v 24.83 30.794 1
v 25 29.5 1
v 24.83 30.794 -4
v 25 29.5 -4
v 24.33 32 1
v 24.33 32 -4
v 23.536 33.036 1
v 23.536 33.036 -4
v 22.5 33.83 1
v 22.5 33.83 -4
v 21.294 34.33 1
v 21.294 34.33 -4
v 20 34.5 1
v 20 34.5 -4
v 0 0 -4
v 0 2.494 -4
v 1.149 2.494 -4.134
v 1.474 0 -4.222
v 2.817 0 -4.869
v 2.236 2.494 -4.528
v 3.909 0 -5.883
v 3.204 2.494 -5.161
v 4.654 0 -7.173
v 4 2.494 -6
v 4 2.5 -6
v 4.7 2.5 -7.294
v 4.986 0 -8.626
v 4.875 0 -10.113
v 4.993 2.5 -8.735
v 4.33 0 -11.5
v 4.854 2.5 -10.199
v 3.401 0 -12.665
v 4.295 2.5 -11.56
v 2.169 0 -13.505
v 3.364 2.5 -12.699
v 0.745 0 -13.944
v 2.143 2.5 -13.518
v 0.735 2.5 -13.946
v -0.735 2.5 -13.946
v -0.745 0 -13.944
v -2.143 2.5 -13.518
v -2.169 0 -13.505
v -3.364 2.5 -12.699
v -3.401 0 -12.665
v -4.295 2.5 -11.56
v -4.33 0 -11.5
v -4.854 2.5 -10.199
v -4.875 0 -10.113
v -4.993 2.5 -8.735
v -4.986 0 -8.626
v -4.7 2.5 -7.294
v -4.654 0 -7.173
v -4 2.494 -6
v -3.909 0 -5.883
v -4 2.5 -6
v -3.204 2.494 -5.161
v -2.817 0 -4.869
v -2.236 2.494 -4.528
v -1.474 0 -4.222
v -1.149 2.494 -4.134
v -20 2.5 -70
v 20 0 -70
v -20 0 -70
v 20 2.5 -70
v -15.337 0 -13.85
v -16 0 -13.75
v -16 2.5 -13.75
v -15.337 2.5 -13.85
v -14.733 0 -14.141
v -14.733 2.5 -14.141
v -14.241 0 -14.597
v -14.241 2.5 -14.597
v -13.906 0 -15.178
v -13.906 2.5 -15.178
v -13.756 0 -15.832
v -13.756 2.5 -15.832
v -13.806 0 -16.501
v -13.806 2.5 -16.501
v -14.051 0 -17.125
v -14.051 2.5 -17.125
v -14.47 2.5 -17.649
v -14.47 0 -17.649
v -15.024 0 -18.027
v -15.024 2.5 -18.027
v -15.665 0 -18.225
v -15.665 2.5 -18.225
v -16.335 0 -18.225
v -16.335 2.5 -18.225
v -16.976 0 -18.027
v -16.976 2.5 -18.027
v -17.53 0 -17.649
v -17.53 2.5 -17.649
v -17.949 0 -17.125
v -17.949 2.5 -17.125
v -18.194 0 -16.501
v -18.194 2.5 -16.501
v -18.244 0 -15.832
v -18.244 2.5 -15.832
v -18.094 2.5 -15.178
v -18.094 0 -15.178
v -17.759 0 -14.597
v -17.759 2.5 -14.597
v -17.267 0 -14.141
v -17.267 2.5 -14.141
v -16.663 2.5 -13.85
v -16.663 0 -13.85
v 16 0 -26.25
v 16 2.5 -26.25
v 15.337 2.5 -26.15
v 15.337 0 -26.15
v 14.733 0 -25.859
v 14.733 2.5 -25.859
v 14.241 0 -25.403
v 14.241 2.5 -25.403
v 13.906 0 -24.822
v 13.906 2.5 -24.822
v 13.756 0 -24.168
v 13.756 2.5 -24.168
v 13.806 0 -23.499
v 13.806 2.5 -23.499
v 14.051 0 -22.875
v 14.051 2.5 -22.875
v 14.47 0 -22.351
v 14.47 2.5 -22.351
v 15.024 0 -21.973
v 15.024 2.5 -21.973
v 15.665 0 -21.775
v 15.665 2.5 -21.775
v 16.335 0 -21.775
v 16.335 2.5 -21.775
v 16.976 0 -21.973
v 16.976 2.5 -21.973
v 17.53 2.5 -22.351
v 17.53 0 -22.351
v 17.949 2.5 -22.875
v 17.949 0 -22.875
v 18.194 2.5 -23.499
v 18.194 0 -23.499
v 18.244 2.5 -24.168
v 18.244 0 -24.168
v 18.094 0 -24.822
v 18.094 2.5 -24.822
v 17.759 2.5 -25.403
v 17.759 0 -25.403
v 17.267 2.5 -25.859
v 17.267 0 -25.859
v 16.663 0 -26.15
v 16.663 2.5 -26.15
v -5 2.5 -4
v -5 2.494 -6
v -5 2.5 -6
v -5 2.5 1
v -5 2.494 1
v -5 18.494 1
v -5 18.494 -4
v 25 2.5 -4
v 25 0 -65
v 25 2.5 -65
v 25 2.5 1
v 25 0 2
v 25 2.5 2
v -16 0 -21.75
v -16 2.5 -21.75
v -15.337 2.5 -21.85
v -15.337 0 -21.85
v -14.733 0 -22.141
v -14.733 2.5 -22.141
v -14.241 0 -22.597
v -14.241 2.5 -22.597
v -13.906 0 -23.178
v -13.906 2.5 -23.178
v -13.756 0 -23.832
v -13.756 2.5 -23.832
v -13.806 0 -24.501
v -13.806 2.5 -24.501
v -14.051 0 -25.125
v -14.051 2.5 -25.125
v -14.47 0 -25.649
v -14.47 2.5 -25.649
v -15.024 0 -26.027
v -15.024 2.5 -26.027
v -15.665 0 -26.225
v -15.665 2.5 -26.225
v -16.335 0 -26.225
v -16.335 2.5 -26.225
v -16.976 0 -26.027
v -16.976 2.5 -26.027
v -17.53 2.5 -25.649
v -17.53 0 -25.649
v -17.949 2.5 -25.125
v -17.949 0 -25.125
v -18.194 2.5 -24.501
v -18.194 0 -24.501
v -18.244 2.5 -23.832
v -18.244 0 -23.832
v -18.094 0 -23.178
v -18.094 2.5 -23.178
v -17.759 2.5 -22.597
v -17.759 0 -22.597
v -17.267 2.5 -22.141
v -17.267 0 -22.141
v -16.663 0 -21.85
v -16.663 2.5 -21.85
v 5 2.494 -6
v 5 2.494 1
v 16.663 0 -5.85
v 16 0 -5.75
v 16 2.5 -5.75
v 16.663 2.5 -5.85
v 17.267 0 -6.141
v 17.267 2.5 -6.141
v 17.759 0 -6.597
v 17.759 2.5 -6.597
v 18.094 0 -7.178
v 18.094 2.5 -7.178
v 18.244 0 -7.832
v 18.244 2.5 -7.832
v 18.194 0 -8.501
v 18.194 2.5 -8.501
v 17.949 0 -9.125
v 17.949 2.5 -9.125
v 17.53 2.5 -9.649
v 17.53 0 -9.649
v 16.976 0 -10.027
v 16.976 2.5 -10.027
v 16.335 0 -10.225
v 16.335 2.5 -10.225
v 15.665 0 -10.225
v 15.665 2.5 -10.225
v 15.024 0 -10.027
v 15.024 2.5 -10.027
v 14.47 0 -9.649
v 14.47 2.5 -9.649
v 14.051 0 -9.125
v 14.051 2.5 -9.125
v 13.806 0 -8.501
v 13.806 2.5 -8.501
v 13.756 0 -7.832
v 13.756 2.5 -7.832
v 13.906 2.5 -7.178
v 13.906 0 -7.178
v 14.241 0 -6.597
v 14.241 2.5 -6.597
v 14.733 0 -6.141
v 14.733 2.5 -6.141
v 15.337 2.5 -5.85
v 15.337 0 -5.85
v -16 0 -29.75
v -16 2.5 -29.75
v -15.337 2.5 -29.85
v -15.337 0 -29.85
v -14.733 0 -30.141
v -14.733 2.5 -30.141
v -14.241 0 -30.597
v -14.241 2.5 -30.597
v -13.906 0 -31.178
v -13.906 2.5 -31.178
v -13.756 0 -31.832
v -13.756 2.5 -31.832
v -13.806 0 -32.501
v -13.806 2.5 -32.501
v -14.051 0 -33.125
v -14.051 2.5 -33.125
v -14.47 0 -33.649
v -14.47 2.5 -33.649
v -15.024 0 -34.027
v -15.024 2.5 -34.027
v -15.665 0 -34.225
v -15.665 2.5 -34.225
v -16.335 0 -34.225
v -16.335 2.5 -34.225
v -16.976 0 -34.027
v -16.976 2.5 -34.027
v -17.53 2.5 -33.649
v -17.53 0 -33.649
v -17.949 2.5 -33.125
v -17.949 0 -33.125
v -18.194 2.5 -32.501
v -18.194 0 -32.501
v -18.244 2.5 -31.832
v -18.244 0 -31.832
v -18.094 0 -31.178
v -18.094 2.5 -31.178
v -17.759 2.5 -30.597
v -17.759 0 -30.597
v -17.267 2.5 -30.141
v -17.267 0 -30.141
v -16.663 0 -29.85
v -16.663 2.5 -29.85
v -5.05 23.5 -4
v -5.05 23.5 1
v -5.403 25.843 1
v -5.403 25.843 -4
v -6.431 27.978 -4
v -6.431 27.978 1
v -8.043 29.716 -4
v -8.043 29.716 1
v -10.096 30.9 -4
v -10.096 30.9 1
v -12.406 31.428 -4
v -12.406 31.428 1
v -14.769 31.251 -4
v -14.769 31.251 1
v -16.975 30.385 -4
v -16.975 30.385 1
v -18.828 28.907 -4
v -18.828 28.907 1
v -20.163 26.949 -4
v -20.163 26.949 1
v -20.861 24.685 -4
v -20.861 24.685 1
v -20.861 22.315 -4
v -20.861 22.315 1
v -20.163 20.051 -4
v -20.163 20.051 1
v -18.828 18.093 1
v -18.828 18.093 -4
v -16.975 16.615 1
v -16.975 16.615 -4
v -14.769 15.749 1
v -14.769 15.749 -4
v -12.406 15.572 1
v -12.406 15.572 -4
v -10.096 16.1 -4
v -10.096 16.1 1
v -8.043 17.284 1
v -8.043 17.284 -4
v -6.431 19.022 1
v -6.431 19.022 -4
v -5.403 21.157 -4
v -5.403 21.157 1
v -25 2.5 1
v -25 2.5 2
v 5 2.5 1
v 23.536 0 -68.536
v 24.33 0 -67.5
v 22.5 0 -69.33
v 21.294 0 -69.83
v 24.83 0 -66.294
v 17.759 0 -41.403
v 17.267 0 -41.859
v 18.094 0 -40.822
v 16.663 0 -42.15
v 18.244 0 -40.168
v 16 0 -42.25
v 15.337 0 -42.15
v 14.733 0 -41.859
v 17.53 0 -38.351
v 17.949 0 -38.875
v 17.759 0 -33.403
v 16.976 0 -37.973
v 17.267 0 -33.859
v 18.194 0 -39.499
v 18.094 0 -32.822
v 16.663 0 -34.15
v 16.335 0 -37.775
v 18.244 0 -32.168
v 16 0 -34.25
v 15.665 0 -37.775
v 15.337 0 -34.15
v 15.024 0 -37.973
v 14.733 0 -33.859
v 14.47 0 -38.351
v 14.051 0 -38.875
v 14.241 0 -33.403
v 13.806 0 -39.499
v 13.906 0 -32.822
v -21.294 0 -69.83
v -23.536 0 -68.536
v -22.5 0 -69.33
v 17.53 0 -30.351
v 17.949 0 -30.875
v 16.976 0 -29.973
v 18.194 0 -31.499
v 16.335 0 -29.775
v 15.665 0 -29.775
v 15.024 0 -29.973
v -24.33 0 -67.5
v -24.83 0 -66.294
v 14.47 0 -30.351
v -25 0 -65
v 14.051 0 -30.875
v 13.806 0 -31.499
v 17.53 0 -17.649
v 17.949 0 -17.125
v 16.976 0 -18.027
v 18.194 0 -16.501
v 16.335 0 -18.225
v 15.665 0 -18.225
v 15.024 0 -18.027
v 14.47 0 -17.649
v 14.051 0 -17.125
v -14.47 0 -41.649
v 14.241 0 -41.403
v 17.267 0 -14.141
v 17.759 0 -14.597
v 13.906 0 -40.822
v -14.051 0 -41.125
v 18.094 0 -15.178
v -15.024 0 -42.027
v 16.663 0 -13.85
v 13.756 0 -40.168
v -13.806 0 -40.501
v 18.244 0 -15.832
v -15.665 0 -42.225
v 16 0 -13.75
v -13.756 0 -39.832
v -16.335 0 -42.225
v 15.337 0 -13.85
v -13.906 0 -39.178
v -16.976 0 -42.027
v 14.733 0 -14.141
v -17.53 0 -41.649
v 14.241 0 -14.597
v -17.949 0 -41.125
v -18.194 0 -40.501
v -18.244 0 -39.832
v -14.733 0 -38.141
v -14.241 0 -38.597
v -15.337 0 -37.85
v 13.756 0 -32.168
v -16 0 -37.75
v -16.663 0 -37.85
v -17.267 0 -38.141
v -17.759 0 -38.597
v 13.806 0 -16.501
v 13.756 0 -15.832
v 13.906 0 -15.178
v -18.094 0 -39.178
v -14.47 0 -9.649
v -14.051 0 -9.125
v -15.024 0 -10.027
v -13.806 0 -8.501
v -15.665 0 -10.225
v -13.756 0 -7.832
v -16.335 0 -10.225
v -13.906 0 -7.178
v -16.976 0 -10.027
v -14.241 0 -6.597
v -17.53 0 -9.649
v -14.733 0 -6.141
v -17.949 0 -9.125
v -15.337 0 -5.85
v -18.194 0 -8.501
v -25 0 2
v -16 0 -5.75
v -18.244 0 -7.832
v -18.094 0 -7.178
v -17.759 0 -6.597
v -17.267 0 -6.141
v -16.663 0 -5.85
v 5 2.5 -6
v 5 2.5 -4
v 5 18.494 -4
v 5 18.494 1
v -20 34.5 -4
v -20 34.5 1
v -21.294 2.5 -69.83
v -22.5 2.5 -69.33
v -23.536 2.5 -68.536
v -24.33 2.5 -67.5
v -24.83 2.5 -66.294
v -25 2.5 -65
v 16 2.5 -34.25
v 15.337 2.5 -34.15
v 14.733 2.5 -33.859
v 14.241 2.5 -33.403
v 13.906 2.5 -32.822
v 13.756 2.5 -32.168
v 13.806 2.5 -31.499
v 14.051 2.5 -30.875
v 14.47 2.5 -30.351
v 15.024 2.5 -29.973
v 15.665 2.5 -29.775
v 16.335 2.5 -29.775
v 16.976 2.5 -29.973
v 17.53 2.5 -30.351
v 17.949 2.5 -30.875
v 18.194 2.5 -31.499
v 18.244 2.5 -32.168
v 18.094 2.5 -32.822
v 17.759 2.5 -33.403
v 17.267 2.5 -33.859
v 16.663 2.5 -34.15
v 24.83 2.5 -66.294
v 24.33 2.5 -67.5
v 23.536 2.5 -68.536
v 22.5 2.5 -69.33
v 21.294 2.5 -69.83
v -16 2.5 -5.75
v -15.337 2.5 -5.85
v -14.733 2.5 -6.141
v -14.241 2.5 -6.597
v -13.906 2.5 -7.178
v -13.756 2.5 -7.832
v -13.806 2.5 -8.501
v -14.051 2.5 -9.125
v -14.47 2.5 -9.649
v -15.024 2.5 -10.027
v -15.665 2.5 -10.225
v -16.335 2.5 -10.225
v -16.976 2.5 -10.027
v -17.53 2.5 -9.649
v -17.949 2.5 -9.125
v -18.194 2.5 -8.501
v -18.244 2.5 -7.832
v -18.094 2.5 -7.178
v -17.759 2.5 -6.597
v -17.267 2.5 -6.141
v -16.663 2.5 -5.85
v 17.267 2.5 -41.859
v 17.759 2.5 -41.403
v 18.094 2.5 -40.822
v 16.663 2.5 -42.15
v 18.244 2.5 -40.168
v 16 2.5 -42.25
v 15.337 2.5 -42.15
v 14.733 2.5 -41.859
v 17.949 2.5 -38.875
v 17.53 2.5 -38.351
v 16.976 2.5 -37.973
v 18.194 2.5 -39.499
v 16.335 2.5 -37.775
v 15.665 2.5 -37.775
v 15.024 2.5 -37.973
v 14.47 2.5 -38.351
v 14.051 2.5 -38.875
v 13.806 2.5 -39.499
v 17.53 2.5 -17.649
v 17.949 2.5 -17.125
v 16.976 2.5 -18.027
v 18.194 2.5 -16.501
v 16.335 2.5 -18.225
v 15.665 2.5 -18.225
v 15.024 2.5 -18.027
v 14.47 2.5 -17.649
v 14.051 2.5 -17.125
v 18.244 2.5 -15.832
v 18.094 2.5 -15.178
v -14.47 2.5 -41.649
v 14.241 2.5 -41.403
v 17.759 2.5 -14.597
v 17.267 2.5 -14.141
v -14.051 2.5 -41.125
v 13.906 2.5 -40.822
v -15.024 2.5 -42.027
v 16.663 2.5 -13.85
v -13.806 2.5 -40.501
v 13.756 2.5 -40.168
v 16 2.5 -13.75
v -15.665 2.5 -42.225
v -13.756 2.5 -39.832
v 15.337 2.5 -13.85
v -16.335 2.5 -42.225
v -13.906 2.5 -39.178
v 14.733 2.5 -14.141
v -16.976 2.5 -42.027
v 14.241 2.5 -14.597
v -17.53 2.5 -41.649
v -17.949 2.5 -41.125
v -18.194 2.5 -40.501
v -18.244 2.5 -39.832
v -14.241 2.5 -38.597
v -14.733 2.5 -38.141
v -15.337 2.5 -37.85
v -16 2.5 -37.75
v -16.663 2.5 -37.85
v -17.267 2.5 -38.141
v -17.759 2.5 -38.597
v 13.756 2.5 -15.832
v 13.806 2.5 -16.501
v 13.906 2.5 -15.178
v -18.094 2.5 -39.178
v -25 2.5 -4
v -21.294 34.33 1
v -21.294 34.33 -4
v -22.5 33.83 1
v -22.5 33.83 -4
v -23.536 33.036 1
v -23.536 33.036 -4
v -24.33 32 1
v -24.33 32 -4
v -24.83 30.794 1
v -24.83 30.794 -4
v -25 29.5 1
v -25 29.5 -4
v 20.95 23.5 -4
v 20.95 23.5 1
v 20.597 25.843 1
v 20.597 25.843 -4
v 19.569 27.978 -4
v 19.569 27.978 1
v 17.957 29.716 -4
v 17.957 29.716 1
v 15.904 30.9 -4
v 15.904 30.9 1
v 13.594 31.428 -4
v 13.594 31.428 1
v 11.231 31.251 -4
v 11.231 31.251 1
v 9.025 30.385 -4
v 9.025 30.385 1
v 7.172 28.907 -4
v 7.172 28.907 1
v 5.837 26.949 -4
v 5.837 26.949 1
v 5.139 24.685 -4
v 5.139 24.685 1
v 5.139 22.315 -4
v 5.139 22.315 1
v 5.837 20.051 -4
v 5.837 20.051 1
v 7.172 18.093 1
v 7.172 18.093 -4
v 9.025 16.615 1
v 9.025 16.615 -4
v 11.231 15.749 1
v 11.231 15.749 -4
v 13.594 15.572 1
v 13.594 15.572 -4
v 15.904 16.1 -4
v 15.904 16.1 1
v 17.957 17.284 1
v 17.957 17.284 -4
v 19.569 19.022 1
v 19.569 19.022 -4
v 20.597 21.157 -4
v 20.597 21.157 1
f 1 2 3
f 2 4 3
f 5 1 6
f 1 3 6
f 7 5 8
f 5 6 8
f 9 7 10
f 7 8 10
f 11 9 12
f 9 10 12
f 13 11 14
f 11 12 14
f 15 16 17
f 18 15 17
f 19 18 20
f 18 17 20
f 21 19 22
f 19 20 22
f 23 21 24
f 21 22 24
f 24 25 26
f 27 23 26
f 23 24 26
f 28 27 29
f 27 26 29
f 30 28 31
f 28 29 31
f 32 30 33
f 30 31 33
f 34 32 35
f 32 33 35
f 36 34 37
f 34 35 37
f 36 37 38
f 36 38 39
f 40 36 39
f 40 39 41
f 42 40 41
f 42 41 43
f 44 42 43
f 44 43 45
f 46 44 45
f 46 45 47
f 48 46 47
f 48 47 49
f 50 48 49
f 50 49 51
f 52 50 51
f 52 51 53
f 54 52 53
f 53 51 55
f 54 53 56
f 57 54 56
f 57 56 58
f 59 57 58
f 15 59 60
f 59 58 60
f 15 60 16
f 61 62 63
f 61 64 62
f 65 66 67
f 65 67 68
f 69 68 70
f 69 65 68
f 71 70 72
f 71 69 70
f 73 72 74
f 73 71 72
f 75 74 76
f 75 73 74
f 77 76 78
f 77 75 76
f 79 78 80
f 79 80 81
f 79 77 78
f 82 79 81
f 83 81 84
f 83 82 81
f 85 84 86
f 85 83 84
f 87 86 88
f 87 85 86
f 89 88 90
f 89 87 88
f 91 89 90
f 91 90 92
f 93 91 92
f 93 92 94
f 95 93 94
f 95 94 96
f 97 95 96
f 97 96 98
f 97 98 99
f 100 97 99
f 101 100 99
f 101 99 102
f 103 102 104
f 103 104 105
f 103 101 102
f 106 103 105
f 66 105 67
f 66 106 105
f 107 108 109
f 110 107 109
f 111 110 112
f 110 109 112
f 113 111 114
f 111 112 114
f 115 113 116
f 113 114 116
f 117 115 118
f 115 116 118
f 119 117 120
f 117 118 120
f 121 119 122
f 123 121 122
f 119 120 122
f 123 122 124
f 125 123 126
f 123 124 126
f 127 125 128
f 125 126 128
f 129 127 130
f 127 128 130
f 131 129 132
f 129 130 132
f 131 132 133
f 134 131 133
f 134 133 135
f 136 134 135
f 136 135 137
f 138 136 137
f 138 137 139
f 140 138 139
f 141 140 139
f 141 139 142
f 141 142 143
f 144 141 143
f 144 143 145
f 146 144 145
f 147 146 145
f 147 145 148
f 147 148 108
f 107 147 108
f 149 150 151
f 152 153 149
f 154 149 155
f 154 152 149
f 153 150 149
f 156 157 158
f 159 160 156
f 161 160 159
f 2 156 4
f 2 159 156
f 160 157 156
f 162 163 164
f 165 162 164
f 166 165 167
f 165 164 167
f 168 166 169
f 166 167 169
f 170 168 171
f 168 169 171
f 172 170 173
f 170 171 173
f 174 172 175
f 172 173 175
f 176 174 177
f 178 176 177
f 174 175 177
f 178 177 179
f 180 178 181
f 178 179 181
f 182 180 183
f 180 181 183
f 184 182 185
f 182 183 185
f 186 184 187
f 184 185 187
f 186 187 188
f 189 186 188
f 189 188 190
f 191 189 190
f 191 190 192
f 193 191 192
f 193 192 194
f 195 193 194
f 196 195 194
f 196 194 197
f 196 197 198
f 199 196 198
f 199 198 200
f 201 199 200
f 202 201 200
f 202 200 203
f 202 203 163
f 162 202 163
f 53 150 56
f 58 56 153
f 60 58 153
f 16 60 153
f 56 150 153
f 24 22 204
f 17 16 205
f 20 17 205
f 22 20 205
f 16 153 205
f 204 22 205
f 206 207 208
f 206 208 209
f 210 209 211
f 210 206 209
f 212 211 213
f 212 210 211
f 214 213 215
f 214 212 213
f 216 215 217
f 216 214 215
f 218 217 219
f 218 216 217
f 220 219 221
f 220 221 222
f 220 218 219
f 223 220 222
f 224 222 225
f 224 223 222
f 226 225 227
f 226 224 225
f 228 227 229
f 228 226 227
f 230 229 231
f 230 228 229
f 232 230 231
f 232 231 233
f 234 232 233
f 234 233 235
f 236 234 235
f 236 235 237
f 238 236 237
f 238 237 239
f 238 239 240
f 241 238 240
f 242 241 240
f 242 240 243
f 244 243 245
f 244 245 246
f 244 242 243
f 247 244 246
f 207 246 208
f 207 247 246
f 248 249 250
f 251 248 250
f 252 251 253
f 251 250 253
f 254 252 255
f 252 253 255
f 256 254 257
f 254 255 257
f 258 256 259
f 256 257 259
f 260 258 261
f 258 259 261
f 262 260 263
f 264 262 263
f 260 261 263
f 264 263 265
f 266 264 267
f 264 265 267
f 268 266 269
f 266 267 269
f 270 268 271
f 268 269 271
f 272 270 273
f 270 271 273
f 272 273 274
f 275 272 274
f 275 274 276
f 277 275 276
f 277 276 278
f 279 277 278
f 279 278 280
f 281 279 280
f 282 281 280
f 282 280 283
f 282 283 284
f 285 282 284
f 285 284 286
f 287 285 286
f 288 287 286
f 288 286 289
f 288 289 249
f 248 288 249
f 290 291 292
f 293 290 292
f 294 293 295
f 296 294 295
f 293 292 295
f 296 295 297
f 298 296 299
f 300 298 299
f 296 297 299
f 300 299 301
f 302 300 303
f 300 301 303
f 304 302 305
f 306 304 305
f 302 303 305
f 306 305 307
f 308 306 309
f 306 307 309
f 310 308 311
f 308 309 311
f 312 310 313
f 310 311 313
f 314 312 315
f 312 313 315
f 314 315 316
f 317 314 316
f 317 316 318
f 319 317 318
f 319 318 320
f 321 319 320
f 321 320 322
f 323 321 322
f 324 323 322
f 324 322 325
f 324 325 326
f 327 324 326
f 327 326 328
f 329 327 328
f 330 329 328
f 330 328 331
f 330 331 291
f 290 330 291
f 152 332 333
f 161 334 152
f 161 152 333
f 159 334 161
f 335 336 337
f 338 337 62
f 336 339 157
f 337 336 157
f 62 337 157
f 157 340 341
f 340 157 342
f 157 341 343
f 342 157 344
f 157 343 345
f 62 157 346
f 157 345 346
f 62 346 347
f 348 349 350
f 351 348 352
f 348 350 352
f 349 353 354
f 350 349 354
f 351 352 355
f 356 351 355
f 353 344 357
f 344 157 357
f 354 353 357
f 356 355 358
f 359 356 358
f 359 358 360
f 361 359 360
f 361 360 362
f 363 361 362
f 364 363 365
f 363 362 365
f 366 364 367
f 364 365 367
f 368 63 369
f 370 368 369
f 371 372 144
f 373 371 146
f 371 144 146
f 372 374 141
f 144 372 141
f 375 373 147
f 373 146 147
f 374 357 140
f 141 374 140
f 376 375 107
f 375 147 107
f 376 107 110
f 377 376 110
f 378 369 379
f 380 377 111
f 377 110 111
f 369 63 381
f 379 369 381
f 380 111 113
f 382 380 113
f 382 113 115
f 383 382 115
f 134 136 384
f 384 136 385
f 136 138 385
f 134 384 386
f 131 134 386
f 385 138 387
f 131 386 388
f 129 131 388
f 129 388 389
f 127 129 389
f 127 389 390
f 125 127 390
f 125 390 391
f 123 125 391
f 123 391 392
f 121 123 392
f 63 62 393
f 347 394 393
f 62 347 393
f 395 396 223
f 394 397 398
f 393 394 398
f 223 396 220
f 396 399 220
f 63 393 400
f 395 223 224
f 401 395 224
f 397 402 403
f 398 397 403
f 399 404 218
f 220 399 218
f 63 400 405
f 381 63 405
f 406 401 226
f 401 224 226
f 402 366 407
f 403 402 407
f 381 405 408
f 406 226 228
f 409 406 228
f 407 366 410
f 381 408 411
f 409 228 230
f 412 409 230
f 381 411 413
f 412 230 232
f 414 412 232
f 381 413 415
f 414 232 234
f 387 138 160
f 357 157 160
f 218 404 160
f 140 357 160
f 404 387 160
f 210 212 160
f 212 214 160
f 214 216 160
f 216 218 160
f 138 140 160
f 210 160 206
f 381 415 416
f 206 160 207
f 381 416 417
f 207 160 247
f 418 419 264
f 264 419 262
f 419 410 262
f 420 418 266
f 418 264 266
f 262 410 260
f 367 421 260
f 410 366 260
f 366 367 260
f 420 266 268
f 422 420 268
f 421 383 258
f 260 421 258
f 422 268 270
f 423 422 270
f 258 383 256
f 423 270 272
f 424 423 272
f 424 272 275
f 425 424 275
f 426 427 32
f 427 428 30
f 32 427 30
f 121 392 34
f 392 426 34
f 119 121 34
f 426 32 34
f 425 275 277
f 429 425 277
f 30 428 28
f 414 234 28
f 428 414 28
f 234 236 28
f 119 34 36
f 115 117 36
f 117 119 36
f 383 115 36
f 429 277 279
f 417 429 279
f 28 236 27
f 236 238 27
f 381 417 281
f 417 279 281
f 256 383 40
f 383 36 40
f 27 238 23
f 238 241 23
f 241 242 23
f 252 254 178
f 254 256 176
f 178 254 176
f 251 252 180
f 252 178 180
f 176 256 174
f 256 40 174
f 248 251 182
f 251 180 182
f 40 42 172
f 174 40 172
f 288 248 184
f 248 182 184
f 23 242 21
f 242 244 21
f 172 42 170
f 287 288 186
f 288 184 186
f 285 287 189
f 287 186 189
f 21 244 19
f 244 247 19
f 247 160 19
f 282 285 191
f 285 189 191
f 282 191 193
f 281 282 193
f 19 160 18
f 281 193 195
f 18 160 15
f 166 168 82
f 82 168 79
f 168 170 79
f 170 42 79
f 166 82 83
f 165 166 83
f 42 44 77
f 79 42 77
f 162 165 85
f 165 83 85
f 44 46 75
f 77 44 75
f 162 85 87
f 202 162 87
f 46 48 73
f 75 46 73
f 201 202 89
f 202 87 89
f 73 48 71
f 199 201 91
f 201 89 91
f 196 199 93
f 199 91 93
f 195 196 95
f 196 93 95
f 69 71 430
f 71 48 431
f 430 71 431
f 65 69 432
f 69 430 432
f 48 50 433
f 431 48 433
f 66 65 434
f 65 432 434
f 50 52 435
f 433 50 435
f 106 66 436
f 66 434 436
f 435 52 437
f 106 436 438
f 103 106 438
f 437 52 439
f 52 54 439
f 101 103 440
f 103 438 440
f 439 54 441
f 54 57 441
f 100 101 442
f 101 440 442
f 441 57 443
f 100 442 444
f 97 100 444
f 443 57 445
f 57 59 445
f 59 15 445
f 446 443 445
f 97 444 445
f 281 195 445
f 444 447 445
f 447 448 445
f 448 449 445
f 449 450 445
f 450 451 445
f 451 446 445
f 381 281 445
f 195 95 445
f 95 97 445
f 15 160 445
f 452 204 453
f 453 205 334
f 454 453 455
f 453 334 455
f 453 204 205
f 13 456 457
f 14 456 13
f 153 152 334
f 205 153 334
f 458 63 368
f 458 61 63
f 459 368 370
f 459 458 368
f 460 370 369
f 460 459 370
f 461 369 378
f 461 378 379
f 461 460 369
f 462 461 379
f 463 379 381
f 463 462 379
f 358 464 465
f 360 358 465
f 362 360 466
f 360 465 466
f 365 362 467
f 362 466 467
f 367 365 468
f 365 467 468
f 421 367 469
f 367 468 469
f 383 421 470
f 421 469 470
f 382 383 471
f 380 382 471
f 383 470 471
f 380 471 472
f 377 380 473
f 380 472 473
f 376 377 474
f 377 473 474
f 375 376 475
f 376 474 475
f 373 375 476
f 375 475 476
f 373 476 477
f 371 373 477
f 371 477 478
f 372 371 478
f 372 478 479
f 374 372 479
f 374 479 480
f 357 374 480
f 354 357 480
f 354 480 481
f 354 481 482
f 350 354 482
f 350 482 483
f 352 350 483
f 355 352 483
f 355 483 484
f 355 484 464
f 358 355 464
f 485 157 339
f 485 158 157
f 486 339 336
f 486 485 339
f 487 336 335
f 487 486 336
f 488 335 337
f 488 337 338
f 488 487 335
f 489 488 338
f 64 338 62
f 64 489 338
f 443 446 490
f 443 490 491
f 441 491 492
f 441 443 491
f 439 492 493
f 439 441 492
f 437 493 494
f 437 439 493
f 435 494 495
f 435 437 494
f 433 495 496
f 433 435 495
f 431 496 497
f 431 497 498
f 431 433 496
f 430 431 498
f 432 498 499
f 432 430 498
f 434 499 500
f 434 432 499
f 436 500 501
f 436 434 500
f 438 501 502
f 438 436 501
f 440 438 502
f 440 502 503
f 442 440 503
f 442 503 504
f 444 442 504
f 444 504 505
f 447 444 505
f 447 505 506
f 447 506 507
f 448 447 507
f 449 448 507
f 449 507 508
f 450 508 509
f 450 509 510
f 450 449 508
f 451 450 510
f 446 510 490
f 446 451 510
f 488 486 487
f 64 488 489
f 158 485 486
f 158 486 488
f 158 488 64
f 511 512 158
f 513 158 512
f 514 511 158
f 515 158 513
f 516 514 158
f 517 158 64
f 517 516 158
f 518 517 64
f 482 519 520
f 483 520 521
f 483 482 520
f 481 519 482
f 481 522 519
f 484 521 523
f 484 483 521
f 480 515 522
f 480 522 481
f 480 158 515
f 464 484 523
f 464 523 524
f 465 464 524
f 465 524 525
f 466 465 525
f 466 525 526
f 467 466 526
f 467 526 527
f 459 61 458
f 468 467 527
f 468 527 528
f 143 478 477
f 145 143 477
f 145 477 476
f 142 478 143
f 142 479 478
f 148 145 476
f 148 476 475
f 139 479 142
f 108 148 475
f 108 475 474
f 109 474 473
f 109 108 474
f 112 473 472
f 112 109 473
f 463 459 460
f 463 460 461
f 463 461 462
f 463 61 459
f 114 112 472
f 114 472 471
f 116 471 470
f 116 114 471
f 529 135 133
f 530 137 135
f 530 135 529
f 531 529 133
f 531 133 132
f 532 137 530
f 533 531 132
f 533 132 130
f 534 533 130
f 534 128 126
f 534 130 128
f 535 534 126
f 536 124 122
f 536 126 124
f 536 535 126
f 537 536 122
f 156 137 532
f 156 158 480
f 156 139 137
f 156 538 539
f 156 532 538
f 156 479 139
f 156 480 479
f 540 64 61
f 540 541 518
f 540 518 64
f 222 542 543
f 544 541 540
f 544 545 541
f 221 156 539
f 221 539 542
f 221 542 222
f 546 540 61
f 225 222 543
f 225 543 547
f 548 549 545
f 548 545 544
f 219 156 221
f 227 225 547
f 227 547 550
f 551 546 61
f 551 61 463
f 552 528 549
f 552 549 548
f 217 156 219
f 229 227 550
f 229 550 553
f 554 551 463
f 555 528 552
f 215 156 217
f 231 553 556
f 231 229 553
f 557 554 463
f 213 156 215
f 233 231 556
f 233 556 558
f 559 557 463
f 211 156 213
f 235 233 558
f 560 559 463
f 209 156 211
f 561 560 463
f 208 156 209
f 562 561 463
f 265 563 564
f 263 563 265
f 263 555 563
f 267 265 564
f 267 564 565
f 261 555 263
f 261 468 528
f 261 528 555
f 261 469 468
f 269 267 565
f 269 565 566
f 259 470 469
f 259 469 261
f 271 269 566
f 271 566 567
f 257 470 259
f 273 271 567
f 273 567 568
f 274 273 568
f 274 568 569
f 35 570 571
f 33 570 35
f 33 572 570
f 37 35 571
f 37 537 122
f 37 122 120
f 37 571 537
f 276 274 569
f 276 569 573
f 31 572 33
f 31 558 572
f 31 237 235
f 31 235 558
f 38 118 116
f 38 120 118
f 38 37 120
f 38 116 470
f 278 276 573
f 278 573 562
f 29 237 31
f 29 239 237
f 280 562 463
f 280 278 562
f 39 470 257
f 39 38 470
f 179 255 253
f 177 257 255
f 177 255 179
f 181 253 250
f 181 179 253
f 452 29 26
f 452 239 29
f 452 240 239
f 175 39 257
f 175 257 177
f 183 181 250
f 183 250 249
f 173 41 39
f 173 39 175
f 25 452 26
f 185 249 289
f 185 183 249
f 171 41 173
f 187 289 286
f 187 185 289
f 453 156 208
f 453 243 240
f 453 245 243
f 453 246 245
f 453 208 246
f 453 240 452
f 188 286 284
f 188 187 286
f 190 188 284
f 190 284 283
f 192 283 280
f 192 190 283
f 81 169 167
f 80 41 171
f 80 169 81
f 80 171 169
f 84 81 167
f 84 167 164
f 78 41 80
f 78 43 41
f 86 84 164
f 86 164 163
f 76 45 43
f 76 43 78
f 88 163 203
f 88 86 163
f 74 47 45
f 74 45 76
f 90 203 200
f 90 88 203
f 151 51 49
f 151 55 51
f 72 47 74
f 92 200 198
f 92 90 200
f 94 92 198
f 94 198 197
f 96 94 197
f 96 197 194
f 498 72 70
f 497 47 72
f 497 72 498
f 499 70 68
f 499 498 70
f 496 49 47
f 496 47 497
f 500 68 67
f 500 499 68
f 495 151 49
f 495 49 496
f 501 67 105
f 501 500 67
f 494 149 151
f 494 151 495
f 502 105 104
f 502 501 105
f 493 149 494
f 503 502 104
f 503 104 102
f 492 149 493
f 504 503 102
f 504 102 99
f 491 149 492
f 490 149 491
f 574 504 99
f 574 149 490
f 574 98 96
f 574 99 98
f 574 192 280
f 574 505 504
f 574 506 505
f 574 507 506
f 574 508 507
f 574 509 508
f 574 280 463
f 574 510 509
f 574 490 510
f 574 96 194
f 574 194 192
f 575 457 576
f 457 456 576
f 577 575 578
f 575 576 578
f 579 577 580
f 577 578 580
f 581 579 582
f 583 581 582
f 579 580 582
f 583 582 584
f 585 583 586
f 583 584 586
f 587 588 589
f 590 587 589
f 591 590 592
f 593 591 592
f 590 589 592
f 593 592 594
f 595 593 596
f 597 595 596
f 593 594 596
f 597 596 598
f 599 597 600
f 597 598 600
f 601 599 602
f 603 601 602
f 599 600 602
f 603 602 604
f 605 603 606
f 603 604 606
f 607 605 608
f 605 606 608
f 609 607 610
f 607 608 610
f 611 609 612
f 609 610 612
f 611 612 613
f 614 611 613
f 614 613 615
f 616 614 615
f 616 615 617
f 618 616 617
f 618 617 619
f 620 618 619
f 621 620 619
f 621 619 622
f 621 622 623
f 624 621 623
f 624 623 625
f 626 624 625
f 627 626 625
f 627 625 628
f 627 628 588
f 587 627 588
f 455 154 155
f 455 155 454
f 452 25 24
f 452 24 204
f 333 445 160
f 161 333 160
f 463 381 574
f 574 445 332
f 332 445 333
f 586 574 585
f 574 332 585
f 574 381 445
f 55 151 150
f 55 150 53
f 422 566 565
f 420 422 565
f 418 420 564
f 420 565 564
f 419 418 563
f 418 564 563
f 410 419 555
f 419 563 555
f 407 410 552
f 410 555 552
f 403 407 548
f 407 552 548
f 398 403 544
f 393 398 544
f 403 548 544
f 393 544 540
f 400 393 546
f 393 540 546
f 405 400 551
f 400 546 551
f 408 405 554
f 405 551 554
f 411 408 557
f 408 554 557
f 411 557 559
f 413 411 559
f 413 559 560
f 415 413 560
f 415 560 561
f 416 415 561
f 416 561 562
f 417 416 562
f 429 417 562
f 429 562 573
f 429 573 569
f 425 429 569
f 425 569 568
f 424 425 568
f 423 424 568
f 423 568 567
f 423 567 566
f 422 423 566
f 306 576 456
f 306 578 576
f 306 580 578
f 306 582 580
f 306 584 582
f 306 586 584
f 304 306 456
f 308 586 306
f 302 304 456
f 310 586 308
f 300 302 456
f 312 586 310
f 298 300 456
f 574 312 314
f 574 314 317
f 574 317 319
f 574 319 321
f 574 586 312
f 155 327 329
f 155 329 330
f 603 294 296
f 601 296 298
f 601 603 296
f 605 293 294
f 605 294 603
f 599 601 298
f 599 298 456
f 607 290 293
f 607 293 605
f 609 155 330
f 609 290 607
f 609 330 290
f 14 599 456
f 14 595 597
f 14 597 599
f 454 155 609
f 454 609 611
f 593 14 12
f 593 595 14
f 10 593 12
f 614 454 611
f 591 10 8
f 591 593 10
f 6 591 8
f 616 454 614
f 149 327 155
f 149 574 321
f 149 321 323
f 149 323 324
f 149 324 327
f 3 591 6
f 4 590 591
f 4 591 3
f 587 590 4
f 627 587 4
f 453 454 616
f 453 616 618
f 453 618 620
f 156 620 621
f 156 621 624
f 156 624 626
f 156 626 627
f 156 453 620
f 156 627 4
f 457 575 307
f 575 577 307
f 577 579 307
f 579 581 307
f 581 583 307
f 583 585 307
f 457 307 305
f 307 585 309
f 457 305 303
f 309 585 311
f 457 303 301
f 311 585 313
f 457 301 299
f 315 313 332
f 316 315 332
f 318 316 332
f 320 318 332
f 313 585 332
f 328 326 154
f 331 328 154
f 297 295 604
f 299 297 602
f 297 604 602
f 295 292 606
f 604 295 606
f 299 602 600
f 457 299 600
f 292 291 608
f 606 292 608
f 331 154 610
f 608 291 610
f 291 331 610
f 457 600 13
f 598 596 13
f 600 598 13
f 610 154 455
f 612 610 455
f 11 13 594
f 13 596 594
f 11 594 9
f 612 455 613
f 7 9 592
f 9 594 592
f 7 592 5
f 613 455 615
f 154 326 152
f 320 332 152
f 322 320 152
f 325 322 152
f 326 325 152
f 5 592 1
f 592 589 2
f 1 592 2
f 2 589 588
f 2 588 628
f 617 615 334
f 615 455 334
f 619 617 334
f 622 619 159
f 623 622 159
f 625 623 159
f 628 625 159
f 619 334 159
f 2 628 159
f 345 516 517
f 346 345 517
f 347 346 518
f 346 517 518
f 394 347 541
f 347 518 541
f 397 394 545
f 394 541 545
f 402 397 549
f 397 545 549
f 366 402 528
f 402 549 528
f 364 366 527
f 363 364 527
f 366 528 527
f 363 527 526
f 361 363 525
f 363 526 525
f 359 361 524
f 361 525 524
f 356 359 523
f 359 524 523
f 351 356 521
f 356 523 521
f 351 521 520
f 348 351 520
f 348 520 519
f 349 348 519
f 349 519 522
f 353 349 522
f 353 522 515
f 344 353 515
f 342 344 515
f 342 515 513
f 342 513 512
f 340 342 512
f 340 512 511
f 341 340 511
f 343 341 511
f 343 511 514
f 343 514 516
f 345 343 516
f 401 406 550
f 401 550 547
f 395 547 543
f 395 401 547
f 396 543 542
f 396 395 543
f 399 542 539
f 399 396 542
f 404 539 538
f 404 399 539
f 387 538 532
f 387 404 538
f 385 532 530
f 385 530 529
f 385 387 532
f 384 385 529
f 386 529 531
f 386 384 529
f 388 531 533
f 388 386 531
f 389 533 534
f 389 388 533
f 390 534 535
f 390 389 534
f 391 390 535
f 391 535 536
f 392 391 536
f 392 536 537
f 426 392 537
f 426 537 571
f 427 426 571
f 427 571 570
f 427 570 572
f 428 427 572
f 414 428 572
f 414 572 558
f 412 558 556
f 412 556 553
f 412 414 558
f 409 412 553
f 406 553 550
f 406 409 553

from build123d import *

# Parameters (mm, degrees)
SKETCH1_R           = 2.25
BOSS_EXTRUDE1_DEPTH = 2.5
SKETCH3_W           = 50
SKETCH3_H           = 5
BOSS_EXTRUDE2_DEPTH = 32
SKETCH7_R           = 5
CUT_EXTRUDE3_DEPTH  = 7
SKETCH5_R           = 7.95
SKETCH5_W           = 10
SKETCH5_H           = 16
CUT_EXTRUDE1_DEPTH  = 7
SKETCH8_W           = 50
SKETCH8_H           = 18
CUT_EXTRUDE4_DEPTH  = 46.265881191
SKETCH9_W           = 50
SKETCH9_H           = 2.5
BOSS_EXTRUDE3_DEPTH = 50
SKETCH10_R          = 2.25
CUT_EXTRUDE5_DEPTH  = 81.925892025
FILLET1_R           = 5


with BuildPart() as part:
    # Sketch1 → Boss-Extrude1 (new body)
    with BuildSketch(Plane(origin=(0, 0, 0), x_dir=(1, 0, 0), z_dir=(0, 1, 0))):
        Polygon((-12, -20), (12, -20), (12, -2), (16, -2), (16, -20), (25, -20), (25, 20), (-25, 20), (-25, -20), (-16, -20), (-16, -2), (-12, -2), align=None)
        with Locations(Location((-16, 16, 0), (0, 0, 270))):
            Circle(SKETCH1_R, mode=Mode.SUBTRACT)
        with Locations(Location((-16, 8, 0), (0, 0, 270))):
            Circle(SKETCH1_R, mode=Mode.SUBTRACT)
        with Locations(Location((16, 16, 0), (0, 0, 270))):
            Circle(SKETCH1_R, mode=Mode.SUBTRACT)
        with Locations(Location((16, 8, 0), (0, 0, 270))):
            Circle(SKETCH1_R, mode=Mode.SUBTRACT)
    extrude(amount=BOSS_EXTRUDE1_DEPTH)

    # Sketch3 → Boss-Extrude2 (add)
    with BuildSketch(Plane(origin=(0, 2.5, 0), x_dir=(1, 0, 0), z_dir=(0, 1, 0))):
        with Locations((0, 1.5)):
            Rectangle(SKETCH3_W, SKETCH3_H)
    extrude(amount=BOSS_EXTRUDE2_DEPTH)

    # Sketch7 → Cut-Extrude3 (cut)
    with BuildSketch(Plane(origin=(0, 2.5, 0), x_dir=(1, 0, 0), z_dir=(0, 1, 0))):
        with Locations(Location((0, 9, 0), (0, 0, 270))):
            Circle(SKETCH7_R)
    extrude(amount=-CUT_EXTRUDE3_DEPTH, mode=Mode.SUBTRACT)

    # Sketch5 → Cut-Extrude1 (cut)
    with BuildSketch(Plane.XY.offset(1)):
        with Locations((-13, 23.5)):
            Circle(SKETCH5_R)
        with Locations((13, 23.5)):
            Circle(SKETCH5_R)
        with Locations((0, 10.494306312)):
            Rectangle(SKETCH5_W, SKETCH5_H)
    extrude(amount=-CUT_EXTRUDE1_DEPTH, mode=Mode.SUBTRACT)

    # Sketch8 → Cut-Extrude4 (cut, through all)
    with BuildSketch(Plane(origin=(0, 2.5, 0), x_dir=(1, 0, 0), z_dir=(0, 1, 0))):
        with Locations((0, -11)):
            Rectangle(SKETCH8_W, SKETCH8_H)
    extrude(amount=-CUT_EXTRUDE4_DEPTH, mode=Mode.SUBTRACT)

    # Sketch9 → Boss-Extrude3 (add)
    with BuildSketch(Plane(origin=(0, 0, -20), x_dir=(-1, 0, 0), z_dir=(0, 0, -1))):
        with Locations((0, 1.25)):
            Rectangle(SKETCH9_W, SKETCH9_H)
    extrude(amount=BOSS_EXTRUDE3_DEPTH)

    # Sketch10 → Cut-Extrude5 (cut, through all)
    with BuildSketch(Plane(origin=(0, 2.5, 0), x_dir=(1, 0, 0), z_dir=(0, 1, 0))):
        with Locations(Location((-16, 16, 0), (0, 0, 270))):
            Circle(SKETCH10_R)
        with Locations(Location((-16, 24, 0), (0, 0, 270))):
            Circle(SKETCH10_R)
        with Locations(Location((-16, 32, 0), (0, 0, 270))):
            Circle(SKETCH10_R)
        with Locations(Location((-16, 40, 0), (0, 0, 270))):
            Circle(SKETCH10_R)
        with Locations(Location((16, 40, 0), (0, 0, 90))):
            Circle(SKETCH10_R)
        with Locations(Location((16, 32, 0), (0, 0, 90))):
            Circle(SKETCH10_R)
        with Locations(Location((16, 24, 0), (0, 0, 90))):
            Circle(SKETCH10_R)
    extrude(amount=-CUT_EXTRUDE5_DEPTH, mode=Mode.SUBTRACT)

    # Fillet1
    fillet1_edges = [part.edges().sort_by_distance(p)[0] for p in [
        (25, 1.25, -70),
        (-25, 1.25, -70),
        (-25, 34.5, -1.5),
        (25, 34.5, -1.5),
    ]]
    fillet(fillet1_edges, radius=FILLET1_R)


solid = part.part
